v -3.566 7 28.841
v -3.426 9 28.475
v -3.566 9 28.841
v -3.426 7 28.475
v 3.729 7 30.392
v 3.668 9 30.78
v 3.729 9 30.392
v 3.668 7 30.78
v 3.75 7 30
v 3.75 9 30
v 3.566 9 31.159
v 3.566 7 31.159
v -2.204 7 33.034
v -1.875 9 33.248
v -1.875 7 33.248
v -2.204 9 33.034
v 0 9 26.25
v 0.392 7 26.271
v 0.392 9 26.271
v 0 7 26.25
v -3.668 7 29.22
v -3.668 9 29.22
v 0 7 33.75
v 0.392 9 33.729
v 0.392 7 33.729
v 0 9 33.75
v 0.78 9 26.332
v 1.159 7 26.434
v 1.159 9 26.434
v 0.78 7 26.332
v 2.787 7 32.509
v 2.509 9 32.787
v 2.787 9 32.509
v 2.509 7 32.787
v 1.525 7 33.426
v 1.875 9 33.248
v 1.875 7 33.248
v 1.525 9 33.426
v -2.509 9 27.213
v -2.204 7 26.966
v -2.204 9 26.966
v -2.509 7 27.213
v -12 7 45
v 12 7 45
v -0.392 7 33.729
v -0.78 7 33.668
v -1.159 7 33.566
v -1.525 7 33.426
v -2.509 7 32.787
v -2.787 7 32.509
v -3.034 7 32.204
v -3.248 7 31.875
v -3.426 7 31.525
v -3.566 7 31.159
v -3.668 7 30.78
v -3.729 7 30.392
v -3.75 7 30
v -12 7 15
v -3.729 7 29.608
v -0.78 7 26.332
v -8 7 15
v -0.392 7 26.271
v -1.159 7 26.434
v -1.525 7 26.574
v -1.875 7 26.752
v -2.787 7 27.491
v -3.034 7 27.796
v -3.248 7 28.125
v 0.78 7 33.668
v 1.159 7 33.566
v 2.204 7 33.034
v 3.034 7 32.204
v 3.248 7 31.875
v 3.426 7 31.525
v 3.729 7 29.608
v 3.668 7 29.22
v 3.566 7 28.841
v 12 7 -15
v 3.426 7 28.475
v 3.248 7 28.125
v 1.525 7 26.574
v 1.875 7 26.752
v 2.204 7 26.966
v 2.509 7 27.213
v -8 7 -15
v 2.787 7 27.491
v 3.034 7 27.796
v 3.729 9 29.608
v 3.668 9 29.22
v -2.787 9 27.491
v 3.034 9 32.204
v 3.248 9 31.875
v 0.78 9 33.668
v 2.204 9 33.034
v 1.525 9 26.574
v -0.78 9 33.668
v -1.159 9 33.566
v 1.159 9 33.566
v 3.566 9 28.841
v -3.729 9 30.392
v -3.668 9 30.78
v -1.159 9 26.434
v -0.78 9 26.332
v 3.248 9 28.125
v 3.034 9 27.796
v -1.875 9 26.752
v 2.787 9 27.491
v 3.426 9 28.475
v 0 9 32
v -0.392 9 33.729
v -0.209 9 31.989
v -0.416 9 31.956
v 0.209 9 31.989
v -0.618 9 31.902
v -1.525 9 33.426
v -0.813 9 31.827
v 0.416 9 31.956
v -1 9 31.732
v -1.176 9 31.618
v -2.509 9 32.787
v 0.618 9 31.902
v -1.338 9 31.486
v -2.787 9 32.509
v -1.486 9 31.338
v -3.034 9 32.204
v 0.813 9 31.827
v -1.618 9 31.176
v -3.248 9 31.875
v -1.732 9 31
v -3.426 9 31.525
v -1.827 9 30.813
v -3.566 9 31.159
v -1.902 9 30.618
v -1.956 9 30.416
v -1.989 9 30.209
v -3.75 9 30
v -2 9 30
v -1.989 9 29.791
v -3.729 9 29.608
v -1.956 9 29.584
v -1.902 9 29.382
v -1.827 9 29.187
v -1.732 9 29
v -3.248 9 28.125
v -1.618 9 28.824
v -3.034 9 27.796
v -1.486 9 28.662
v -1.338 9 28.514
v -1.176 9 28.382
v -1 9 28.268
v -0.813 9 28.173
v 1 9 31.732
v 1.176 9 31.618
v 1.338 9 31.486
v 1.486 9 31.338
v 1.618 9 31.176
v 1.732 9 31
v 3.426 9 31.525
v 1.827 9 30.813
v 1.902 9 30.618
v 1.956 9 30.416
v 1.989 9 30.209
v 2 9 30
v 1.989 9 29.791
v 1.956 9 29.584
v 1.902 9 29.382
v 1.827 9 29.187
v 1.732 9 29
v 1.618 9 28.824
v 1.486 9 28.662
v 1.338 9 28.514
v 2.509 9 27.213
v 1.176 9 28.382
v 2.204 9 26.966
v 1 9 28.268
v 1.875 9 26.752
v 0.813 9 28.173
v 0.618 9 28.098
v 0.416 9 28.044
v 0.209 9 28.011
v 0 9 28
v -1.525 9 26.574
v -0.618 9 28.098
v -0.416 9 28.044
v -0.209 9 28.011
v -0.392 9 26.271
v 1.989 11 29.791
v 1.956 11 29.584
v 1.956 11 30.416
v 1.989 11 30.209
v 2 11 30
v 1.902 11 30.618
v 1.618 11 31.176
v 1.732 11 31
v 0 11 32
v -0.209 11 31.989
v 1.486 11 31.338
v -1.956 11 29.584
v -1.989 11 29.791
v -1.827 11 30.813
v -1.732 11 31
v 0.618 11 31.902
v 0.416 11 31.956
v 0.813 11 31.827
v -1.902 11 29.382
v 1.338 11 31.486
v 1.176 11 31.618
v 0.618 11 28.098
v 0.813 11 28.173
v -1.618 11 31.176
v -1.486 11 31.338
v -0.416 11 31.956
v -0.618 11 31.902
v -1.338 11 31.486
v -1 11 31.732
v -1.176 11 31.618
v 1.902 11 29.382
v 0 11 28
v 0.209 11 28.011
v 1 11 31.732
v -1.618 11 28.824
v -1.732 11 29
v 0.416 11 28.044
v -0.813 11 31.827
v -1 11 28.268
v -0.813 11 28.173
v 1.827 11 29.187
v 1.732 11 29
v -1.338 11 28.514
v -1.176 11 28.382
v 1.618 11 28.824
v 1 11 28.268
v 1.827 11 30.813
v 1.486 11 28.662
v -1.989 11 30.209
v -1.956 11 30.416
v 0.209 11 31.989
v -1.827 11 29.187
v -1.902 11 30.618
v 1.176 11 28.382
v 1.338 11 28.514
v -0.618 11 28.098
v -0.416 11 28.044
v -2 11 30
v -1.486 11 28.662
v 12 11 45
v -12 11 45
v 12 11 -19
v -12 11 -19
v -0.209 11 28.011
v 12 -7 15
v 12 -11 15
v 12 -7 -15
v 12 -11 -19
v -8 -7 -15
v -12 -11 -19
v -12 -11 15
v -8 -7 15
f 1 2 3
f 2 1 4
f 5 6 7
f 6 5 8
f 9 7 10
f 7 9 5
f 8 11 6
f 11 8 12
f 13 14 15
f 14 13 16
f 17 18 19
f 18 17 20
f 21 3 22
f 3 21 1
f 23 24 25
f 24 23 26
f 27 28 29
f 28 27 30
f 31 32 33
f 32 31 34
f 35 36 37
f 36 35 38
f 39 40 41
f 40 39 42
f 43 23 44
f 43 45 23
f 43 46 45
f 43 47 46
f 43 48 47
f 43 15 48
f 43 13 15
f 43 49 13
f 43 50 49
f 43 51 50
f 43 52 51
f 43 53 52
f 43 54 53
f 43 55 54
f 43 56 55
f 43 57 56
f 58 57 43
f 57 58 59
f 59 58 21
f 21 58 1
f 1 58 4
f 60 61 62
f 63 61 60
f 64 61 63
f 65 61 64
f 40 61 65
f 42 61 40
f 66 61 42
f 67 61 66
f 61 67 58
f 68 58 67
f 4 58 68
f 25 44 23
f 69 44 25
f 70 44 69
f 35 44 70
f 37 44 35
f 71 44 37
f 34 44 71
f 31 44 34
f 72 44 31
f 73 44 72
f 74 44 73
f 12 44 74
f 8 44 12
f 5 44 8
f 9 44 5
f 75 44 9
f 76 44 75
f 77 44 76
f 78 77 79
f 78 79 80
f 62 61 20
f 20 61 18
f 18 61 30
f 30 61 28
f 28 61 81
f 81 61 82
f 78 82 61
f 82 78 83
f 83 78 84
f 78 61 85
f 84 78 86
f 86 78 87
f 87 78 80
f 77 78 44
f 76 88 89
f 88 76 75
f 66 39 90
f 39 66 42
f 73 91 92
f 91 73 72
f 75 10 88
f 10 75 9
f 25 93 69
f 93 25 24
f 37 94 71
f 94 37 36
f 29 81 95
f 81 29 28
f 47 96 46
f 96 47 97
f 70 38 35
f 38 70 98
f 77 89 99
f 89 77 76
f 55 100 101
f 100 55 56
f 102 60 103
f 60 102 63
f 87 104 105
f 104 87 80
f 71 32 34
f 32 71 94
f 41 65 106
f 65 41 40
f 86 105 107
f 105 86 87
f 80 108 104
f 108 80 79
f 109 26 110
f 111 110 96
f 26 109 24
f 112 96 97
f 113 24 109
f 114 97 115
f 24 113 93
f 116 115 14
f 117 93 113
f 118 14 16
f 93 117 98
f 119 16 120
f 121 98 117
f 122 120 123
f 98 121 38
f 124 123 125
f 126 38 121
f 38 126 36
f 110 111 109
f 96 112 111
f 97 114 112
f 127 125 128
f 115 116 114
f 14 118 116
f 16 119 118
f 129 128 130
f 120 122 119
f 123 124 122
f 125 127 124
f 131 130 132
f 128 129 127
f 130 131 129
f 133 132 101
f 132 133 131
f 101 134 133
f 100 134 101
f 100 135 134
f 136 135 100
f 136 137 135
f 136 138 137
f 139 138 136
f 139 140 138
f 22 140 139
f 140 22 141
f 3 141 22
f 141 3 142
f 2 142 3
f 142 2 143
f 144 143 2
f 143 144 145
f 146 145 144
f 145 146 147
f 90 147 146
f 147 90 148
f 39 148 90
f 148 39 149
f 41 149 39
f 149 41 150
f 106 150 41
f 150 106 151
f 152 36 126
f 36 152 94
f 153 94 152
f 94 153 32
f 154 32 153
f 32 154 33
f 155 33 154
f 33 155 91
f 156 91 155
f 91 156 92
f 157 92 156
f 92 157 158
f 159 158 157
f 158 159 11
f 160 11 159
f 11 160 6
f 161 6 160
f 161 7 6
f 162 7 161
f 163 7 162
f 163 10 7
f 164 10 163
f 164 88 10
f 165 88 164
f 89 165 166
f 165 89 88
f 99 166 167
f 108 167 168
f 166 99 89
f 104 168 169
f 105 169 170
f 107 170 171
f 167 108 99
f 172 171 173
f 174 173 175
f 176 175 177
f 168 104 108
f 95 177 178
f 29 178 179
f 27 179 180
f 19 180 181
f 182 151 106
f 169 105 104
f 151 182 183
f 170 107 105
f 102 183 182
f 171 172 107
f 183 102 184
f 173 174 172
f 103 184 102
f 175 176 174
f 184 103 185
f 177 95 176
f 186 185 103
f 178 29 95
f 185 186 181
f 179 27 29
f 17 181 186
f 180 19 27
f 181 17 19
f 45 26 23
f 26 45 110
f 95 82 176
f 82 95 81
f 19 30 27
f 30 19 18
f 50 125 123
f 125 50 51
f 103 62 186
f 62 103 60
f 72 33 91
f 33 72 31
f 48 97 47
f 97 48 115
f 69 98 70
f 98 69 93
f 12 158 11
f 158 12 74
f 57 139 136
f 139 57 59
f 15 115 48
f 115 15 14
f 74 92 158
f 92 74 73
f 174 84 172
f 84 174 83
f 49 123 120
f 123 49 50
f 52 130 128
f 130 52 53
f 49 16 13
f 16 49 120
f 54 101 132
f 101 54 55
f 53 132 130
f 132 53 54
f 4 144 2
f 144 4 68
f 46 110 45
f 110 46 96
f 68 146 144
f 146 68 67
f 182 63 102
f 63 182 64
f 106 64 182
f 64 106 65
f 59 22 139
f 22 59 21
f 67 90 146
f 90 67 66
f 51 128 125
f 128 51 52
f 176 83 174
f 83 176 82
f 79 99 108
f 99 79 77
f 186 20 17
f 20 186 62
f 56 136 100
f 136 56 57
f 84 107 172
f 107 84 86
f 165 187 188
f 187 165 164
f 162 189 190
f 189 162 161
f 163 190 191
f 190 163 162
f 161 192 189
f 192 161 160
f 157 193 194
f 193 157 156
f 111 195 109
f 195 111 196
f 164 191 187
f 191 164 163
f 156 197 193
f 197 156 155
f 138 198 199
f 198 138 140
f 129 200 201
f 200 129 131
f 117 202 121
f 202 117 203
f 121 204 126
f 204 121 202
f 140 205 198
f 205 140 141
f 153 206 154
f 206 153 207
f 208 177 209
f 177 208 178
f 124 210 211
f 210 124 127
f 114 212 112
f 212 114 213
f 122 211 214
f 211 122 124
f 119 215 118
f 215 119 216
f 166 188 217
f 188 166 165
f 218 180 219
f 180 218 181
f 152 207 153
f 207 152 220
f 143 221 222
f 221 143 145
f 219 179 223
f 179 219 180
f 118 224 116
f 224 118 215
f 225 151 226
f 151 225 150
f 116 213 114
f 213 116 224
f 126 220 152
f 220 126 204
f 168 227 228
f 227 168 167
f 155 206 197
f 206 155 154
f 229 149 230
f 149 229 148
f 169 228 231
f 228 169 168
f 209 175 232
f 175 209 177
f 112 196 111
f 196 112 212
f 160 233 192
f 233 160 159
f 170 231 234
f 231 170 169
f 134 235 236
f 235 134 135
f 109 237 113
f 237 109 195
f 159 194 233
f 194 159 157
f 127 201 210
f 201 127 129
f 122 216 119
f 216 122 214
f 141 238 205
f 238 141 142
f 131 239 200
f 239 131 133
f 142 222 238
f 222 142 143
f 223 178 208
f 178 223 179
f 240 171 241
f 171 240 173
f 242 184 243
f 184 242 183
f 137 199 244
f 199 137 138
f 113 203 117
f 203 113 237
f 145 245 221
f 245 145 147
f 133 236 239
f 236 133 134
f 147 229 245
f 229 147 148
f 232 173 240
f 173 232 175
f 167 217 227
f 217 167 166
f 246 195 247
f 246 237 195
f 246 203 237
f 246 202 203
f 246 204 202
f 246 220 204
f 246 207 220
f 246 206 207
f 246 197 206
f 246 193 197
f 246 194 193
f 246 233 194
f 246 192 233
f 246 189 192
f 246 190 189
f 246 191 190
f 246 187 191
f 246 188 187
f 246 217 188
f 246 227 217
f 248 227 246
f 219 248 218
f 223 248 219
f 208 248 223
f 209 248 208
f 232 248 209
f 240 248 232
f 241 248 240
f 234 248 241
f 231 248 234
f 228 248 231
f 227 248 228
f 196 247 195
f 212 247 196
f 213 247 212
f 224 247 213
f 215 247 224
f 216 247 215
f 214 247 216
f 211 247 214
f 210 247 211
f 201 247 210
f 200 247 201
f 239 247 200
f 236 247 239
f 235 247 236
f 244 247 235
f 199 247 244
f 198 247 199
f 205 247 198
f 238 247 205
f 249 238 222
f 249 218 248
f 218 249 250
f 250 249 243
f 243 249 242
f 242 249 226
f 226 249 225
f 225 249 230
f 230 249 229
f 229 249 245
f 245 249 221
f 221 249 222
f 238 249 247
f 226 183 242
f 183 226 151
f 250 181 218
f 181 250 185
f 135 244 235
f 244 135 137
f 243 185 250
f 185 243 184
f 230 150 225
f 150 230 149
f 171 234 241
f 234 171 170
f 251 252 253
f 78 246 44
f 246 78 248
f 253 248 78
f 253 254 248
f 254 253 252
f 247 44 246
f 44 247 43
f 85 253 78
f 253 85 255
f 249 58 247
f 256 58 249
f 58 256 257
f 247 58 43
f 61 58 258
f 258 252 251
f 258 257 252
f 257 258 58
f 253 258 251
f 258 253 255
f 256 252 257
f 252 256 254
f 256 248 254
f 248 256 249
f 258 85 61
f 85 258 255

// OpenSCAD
$fn = 60;



//length(1/4th of tablet width)
x1 = 30;
//width(from edge to bezzle)
x2 = 20;
//thickness of tablet
x3 = 14;

//walls thinkness(default4)
x4 = 4;

//screw (50/50 for head and thread /x4 walls
//head
xd1 = 7.5;
//thread
xd2 = 4;

module screw(){
//screw head
union(){
translate([0,0,x4/2/2])
cylinder(h = x4/2, d1 = xd1, d2 = xd1, 
    center = true);
//screw thread
translate([0,0,-x4/2/2])
cylinder(h = x4/2, d1 = xd2, d2 = xd2, center = true);}
}
//top
rotate([0,0,0])
translate([0,-x3/2+-x4/2,0])
cube([x2+x4,x4,x1], center=true);


//back
difference(){
rotate([0,0,0])
translate([0,x3/2+x4/2,x1/2])
cube([x2+x4,x4,x1*2], center=true);
rotate([90,0,0])
//hole
translate([0,x1,-x3/2-x4/2])
#screw();}

//bottom
rotate([0,0,0])
translate([0,0,-x1/2+-x4/2])
cube([x2+x4,x3+x4*2,x4], center=true);


//side
rotate([0,0,0])
translate([-x2/2+x4+-x4,0,0])
cube([x4,x3,x1], center=true);





